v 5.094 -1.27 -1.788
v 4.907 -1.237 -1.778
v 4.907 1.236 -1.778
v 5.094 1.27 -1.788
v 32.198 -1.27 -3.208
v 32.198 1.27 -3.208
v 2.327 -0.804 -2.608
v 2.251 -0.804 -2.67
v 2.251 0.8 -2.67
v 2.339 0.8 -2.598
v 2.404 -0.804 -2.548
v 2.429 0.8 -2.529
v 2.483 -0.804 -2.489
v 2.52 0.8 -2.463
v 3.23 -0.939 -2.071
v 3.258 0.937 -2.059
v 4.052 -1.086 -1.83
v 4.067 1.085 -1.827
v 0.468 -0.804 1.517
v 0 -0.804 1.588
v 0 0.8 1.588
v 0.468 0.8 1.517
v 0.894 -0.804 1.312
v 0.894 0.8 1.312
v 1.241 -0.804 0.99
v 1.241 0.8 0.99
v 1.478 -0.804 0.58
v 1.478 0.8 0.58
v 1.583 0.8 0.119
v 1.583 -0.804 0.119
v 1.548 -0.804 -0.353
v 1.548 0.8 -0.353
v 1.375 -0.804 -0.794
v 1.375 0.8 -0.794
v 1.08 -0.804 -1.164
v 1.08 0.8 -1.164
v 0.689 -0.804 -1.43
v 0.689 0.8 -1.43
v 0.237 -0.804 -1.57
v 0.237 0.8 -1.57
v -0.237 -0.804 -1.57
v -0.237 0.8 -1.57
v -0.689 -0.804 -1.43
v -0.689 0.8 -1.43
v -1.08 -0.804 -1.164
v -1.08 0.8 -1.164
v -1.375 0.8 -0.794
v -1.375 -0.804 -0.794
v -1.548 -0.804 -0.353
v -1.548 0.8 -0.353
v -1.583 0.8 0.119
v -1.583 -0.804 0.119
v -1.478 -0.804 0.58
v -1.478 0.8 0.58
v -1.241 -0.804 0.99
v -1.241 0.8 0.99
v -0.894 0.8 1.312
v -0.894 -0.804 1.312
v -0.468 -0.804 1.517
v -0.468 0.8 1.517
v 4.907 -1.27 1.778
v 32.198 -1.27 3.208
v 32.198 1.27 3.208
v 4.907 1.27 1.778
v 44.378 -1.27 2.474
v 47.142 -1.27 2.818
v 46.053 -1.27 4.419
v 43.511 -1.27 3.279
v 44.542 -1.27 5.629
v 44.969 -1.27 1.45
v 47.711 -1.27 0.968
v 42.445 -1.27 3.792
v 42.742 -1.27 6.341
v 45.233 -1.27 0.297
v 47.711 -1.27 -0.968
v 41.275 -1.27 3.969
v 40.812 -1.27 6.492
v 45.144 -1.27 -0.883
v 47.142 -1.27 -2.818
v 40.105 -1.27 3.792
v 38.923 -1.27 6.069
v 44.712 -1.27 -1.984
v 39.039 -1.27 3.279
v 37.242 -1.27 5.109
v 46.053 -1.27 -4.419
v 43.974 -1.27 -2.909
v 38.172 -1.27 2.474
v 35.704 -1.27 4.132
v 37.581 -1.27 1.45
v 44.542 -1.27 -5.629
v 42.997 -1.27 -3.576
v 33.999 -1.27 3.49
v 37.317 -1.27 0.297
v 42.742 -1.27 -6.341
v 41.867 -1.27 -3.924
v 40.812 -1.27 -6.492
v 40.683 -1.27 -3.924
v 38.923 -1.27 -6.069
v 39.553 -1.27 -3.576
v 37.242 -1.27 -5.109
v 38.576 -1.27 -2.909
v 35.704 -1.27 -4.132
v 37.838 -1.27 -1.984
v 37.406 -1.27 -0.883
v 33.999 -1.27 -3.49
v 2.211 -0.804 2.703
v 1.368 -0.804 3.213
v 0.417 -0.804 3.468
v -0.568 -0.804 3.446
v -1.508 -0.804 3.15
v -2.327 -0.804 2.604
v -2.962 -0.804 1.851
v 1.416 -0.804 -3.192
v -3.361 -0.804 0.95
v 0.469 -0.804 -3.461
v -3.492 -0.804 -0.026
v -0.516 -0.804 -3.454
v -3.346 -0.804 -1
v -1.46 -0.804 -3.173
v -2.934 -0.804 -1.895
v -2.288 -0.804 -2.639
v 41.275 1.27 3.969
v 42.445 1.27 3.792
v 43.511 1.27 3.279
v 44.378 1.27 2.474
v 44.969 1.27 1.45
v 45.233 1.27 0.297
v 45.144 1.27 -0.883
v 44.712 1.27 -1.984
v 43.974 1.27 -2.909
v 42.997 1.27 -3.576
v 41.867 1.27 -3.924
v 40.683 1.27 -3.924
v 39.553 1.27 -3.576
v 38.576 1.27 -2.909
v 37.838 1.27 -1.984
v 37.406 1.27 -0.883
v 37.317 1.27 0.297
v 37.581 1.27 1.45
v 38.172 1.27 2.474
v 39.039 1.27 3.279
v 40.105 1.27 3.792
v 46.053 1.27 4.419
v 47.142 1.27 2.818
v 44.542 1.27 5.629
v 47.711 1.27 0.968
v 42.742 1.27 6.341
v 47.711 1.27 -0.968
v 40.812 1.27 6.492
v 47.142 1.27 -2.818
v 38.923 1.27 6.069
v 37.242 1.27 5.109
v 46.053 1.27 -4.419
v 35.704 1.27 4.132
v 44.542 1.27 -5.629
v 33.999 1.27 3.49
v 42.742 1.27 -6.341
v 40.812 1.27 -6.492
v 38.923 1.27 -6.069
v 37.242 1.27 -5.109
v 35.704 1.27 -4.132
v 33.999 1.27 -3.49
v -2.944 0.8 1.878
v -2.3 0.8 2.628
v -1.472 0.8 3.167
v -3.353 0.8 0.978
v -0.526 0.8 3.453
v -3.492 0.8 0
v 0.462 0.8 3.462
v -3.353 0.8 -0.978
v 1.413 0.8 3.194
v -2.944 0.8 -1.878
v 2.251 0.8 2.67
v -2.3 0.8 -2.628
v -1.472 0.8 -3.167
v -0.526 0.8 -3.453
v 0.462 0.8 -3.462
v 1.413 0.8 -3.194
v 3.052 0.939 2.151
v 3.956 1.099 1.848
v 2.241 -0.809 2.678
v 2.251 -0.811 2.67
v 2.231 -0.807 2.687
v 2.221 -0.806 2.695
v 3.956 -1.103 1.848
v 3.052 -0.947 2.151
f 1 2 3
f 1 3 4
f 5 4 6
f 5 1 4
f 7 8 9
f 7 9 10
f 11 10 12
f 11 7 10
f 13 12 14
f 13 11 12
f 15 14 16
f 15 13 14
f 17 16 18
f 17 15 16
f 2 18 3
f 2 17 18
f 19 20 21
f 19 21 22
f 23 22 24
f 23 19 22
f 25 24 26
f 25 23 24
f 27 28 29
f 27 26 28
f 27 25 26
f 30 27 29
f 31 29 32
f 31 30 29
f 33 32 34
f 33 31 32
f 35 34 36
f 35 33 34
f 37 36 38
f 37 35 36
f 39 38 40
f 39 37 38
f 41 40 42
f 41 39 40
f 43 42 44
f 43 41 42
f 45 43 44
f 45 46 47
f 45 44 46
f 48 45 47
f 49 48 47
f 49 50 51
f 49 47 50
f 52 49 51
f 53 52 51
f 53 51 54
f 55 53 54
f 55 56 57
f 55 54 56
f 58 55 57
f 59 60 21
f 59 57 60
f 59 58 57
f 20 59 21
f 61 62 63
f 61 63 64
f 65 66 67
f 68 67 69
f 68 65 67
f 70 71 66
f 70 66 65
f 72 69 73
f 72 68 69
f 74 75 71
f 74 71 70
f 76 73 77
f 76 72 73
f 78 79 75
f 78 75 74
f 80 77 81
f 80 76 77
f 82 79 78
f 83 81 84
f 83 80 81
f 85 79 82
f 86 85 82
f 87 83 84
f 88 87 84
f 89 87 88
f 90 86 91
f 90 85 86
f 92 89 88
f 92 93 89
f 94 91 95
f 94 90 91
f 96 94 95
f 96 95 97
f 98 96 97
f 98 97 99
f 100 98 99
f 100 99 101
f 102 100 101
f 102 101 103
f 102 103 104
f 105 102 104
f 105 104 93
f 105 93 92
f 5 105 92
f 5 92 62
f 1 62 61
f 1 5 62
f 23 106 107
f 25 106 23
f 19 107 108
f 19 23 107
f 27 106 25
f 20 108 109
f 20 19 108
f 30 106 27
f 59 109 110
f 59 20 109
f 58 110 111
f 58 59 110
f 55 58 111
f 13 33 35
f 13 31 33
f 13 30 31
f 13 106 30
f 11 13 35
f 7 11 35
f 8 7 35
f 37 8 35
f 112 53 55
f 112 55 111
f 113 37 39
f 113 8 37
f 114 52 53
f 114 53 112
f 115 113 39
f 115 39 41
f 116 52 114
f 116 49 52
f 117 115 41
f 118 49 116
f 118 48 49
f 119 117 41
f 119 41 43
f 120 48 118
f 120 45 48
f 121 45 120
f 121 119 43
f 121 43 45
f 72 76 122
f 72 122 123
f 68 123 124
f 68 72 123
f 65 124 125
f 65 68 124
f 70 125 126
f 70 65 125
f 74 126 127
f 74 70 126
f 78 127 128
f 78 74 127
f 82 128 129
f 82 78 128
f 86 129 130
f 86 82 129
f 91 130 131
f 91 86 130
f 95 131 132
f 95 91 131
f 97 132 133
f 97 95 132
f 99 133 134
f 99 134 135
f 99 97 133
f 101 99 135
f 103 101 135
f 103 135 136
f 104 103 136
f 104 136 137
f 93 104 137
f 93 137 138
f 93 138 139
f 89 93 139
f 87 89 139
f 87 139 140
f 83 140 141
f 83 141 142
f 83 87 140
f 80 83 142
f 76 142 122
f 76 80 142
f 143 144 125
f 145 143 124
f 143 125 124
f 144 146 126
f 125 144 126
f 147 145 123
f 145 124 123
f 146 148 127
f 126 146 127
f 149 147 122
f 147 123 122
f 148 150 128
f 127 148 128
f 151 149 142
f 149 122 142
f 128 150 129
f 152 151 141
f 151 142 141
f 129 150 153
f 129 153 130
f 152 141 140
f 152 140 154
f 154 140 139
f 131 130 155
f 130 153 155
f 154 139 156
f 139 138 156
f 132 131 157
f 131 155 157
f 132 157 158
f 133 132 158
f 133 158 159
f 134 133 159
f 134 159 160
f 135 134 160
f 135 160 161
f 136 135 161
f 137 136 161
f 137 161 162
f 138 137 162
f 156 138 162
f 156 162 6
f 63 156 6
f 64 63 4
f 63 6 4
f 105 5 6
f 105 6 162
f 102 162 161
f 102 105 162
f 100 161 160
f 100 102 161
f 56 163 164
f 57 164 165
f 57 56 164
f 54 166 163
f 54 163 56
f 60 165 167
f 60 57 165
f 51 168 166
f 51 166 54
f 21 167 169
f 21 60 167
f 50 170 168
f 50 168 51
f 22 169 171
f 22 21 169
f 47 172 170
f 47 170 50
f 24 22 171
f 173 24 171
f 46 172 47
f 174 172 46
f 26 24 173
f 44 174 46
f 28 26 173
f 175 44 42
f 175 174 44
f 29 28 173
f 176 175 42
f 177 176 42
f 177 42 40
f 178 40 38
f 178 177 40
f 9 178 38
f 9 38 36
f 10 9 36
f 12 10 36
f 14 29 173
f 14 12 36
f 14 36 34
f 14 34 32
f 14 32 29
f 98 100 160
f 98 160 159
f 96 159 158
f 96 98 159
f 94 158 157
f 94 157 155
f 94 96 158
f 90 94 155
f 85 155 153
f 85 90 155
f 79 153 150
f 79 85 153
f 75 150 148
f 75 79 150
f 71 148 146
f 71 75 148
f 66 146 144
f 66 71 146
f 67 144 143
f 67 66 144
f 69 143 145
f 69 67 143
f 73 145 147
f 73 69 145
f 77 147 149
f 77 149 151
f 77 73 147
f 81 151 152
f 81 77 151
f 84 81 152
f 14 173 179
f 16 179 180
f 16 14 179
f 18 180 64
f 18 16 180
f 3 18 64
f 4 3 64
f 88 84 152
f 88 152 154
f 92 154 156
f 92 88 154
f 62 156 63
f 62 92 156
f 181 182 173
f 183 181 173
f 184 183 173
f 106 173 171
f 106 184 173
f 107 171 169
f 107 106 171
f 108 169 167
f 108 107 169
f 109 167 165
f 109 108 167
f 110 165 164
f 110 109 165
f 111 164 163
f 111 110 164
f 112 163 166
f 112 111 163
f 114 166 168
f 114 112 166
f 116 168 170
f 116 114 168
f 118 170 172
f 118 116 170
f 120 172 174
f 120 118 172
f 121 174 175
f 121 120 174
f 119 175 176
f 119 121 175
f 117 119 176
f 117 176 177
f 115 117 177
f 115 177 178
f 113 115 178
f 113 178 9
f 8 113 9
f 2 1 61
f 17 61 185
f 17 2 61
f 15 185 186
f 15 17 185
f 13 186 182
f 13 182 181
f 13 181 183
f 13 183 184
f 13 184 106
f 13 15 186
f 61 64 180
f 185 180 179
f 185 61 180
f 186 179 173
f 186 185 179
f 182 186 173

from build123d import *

# Parameters (mm, degrees)
BOSS_EXTRUDE1_DEPTH      = 1.27
BOSS_EXTRUDE1_DEPTH_BACK = 1.27
SKETCH1_R                = 1.5875
SKETCH1_R_2              = 3.96875
CUT_EXTRUDE1_DEPTH       = 49.548015703
CUT_EXTRUDE1_DEPTH_BACK  = 49.548015703
CUT_EXTRUDE2_DEPTH       = 49.548015703
CUT_EXTRUDE2_DEPTH_BACK  = 49.548015703


with BuildPart() as part:
    # Sketch1 → Boss-Extrude1 (new, two sides: drawn at the far end of the back side and taken through both)
    with BuildSketch(Plane(origin=(0, 0, 0), x_dir=(1, 0, 0), z_dir=(0, 1, 0)).offset(-BOSS_EXTRUDE1_DEPTH_BACK)):
        with BuildLine():
            Line((4.906744273, 1.778), (32.198389451, 3.208294517))
            ThreePointArc((32.198389451, 3.208294517), (34.867586322, 3.767022283), (37.24183541, 5.108562416))
            ThreePointArc((37.24183541, 5.108562416), (47.78375, 0), (37.24183541, -5.108562416))
            ThreePointArc((37.24183541, -5.108562416), (34.867586322, -3.767022283), (32.198389451, -3.208294517))
            Line((32.198389451, -3.208294517), (4.906744273, -1.778))
            ThreePointArc((4.906744273, -1.778), (3.494086568, -1.971116067), (2.251338568, -2.670024513))
            ThreePointArc((2.251338568, -2.670024513), (-3.4925, 0), (2.251338568, 2.670024513))
            ThreePointArc((2.251338568, 2.670024513), (3.494086568, 1.971116067), (4.906744273, 1.778))
        make_face()
        Circle(SKETCH1_R, mode=Mode.SUBTRACT)
        with Locations((41.275, 0)):
            Circle(SKETCH1_R_2, mode=Mode.SUBTRACT)
    extrude(amount=BOSS_EXTRUDE1_DEPTH + BOSS_EXTRUDE1_DEPTH_BACK)

    # Sketch2 → Cut-Extrude1 (cut, two sides: drawn at the far end of the back side and taken through both)
    with BuildSketch(Plane(origin=(-0.079485975, 0, 1.516682746), x_dir=(0.9986295347545739, 0, 0.05233595624294426), z_dir=(-0.05233595624294425, 0, 0.9986295347545738)).offset(-CUT_EXTRUDE1_DEPTH_BACK)):
        Polygon((-3.4925, 0.8001), (2.387991473, 0.8001), (4.99307308, 1.27), (4.99307308, 1.856442967), (-4.865374357, 1.856442967), align=None)
    extrude(amount=CUT_EXTRUDE1_DEPTH + CUT_EXTRUDE1_DEPTH_BACK, mode=Mode.SUBTRACT)

    # Sketch3 → Cut-Extrude2 (cut, two sides: drawn at the far end of the back side and taken through both)
    with BuildSketch(Plane(origin=(-0.079485975, 0, 1.516682746), x_dir=(0.9986295347545739, 0, 0.05233595624294426), z_dir=(-0.05233595624294425, 0, 0.9986295347545738)).offset(-CUT_EXTRUDE2_DEPTH_BACK)):
        Polygon((4.99307308, -1.27), (2.3495, -0.80386674), (-3.4925, -0.80386674), (-4.094294219, -2.202797579), (4.99307308, -2.202797579), align=None)
    extrude(amount=CUT_EXTRUDE2_DEPTH + CUT_EXTRUDE2_DEPTH_BACK, mode=Mode.SUBTRACT)


solid = part.part
